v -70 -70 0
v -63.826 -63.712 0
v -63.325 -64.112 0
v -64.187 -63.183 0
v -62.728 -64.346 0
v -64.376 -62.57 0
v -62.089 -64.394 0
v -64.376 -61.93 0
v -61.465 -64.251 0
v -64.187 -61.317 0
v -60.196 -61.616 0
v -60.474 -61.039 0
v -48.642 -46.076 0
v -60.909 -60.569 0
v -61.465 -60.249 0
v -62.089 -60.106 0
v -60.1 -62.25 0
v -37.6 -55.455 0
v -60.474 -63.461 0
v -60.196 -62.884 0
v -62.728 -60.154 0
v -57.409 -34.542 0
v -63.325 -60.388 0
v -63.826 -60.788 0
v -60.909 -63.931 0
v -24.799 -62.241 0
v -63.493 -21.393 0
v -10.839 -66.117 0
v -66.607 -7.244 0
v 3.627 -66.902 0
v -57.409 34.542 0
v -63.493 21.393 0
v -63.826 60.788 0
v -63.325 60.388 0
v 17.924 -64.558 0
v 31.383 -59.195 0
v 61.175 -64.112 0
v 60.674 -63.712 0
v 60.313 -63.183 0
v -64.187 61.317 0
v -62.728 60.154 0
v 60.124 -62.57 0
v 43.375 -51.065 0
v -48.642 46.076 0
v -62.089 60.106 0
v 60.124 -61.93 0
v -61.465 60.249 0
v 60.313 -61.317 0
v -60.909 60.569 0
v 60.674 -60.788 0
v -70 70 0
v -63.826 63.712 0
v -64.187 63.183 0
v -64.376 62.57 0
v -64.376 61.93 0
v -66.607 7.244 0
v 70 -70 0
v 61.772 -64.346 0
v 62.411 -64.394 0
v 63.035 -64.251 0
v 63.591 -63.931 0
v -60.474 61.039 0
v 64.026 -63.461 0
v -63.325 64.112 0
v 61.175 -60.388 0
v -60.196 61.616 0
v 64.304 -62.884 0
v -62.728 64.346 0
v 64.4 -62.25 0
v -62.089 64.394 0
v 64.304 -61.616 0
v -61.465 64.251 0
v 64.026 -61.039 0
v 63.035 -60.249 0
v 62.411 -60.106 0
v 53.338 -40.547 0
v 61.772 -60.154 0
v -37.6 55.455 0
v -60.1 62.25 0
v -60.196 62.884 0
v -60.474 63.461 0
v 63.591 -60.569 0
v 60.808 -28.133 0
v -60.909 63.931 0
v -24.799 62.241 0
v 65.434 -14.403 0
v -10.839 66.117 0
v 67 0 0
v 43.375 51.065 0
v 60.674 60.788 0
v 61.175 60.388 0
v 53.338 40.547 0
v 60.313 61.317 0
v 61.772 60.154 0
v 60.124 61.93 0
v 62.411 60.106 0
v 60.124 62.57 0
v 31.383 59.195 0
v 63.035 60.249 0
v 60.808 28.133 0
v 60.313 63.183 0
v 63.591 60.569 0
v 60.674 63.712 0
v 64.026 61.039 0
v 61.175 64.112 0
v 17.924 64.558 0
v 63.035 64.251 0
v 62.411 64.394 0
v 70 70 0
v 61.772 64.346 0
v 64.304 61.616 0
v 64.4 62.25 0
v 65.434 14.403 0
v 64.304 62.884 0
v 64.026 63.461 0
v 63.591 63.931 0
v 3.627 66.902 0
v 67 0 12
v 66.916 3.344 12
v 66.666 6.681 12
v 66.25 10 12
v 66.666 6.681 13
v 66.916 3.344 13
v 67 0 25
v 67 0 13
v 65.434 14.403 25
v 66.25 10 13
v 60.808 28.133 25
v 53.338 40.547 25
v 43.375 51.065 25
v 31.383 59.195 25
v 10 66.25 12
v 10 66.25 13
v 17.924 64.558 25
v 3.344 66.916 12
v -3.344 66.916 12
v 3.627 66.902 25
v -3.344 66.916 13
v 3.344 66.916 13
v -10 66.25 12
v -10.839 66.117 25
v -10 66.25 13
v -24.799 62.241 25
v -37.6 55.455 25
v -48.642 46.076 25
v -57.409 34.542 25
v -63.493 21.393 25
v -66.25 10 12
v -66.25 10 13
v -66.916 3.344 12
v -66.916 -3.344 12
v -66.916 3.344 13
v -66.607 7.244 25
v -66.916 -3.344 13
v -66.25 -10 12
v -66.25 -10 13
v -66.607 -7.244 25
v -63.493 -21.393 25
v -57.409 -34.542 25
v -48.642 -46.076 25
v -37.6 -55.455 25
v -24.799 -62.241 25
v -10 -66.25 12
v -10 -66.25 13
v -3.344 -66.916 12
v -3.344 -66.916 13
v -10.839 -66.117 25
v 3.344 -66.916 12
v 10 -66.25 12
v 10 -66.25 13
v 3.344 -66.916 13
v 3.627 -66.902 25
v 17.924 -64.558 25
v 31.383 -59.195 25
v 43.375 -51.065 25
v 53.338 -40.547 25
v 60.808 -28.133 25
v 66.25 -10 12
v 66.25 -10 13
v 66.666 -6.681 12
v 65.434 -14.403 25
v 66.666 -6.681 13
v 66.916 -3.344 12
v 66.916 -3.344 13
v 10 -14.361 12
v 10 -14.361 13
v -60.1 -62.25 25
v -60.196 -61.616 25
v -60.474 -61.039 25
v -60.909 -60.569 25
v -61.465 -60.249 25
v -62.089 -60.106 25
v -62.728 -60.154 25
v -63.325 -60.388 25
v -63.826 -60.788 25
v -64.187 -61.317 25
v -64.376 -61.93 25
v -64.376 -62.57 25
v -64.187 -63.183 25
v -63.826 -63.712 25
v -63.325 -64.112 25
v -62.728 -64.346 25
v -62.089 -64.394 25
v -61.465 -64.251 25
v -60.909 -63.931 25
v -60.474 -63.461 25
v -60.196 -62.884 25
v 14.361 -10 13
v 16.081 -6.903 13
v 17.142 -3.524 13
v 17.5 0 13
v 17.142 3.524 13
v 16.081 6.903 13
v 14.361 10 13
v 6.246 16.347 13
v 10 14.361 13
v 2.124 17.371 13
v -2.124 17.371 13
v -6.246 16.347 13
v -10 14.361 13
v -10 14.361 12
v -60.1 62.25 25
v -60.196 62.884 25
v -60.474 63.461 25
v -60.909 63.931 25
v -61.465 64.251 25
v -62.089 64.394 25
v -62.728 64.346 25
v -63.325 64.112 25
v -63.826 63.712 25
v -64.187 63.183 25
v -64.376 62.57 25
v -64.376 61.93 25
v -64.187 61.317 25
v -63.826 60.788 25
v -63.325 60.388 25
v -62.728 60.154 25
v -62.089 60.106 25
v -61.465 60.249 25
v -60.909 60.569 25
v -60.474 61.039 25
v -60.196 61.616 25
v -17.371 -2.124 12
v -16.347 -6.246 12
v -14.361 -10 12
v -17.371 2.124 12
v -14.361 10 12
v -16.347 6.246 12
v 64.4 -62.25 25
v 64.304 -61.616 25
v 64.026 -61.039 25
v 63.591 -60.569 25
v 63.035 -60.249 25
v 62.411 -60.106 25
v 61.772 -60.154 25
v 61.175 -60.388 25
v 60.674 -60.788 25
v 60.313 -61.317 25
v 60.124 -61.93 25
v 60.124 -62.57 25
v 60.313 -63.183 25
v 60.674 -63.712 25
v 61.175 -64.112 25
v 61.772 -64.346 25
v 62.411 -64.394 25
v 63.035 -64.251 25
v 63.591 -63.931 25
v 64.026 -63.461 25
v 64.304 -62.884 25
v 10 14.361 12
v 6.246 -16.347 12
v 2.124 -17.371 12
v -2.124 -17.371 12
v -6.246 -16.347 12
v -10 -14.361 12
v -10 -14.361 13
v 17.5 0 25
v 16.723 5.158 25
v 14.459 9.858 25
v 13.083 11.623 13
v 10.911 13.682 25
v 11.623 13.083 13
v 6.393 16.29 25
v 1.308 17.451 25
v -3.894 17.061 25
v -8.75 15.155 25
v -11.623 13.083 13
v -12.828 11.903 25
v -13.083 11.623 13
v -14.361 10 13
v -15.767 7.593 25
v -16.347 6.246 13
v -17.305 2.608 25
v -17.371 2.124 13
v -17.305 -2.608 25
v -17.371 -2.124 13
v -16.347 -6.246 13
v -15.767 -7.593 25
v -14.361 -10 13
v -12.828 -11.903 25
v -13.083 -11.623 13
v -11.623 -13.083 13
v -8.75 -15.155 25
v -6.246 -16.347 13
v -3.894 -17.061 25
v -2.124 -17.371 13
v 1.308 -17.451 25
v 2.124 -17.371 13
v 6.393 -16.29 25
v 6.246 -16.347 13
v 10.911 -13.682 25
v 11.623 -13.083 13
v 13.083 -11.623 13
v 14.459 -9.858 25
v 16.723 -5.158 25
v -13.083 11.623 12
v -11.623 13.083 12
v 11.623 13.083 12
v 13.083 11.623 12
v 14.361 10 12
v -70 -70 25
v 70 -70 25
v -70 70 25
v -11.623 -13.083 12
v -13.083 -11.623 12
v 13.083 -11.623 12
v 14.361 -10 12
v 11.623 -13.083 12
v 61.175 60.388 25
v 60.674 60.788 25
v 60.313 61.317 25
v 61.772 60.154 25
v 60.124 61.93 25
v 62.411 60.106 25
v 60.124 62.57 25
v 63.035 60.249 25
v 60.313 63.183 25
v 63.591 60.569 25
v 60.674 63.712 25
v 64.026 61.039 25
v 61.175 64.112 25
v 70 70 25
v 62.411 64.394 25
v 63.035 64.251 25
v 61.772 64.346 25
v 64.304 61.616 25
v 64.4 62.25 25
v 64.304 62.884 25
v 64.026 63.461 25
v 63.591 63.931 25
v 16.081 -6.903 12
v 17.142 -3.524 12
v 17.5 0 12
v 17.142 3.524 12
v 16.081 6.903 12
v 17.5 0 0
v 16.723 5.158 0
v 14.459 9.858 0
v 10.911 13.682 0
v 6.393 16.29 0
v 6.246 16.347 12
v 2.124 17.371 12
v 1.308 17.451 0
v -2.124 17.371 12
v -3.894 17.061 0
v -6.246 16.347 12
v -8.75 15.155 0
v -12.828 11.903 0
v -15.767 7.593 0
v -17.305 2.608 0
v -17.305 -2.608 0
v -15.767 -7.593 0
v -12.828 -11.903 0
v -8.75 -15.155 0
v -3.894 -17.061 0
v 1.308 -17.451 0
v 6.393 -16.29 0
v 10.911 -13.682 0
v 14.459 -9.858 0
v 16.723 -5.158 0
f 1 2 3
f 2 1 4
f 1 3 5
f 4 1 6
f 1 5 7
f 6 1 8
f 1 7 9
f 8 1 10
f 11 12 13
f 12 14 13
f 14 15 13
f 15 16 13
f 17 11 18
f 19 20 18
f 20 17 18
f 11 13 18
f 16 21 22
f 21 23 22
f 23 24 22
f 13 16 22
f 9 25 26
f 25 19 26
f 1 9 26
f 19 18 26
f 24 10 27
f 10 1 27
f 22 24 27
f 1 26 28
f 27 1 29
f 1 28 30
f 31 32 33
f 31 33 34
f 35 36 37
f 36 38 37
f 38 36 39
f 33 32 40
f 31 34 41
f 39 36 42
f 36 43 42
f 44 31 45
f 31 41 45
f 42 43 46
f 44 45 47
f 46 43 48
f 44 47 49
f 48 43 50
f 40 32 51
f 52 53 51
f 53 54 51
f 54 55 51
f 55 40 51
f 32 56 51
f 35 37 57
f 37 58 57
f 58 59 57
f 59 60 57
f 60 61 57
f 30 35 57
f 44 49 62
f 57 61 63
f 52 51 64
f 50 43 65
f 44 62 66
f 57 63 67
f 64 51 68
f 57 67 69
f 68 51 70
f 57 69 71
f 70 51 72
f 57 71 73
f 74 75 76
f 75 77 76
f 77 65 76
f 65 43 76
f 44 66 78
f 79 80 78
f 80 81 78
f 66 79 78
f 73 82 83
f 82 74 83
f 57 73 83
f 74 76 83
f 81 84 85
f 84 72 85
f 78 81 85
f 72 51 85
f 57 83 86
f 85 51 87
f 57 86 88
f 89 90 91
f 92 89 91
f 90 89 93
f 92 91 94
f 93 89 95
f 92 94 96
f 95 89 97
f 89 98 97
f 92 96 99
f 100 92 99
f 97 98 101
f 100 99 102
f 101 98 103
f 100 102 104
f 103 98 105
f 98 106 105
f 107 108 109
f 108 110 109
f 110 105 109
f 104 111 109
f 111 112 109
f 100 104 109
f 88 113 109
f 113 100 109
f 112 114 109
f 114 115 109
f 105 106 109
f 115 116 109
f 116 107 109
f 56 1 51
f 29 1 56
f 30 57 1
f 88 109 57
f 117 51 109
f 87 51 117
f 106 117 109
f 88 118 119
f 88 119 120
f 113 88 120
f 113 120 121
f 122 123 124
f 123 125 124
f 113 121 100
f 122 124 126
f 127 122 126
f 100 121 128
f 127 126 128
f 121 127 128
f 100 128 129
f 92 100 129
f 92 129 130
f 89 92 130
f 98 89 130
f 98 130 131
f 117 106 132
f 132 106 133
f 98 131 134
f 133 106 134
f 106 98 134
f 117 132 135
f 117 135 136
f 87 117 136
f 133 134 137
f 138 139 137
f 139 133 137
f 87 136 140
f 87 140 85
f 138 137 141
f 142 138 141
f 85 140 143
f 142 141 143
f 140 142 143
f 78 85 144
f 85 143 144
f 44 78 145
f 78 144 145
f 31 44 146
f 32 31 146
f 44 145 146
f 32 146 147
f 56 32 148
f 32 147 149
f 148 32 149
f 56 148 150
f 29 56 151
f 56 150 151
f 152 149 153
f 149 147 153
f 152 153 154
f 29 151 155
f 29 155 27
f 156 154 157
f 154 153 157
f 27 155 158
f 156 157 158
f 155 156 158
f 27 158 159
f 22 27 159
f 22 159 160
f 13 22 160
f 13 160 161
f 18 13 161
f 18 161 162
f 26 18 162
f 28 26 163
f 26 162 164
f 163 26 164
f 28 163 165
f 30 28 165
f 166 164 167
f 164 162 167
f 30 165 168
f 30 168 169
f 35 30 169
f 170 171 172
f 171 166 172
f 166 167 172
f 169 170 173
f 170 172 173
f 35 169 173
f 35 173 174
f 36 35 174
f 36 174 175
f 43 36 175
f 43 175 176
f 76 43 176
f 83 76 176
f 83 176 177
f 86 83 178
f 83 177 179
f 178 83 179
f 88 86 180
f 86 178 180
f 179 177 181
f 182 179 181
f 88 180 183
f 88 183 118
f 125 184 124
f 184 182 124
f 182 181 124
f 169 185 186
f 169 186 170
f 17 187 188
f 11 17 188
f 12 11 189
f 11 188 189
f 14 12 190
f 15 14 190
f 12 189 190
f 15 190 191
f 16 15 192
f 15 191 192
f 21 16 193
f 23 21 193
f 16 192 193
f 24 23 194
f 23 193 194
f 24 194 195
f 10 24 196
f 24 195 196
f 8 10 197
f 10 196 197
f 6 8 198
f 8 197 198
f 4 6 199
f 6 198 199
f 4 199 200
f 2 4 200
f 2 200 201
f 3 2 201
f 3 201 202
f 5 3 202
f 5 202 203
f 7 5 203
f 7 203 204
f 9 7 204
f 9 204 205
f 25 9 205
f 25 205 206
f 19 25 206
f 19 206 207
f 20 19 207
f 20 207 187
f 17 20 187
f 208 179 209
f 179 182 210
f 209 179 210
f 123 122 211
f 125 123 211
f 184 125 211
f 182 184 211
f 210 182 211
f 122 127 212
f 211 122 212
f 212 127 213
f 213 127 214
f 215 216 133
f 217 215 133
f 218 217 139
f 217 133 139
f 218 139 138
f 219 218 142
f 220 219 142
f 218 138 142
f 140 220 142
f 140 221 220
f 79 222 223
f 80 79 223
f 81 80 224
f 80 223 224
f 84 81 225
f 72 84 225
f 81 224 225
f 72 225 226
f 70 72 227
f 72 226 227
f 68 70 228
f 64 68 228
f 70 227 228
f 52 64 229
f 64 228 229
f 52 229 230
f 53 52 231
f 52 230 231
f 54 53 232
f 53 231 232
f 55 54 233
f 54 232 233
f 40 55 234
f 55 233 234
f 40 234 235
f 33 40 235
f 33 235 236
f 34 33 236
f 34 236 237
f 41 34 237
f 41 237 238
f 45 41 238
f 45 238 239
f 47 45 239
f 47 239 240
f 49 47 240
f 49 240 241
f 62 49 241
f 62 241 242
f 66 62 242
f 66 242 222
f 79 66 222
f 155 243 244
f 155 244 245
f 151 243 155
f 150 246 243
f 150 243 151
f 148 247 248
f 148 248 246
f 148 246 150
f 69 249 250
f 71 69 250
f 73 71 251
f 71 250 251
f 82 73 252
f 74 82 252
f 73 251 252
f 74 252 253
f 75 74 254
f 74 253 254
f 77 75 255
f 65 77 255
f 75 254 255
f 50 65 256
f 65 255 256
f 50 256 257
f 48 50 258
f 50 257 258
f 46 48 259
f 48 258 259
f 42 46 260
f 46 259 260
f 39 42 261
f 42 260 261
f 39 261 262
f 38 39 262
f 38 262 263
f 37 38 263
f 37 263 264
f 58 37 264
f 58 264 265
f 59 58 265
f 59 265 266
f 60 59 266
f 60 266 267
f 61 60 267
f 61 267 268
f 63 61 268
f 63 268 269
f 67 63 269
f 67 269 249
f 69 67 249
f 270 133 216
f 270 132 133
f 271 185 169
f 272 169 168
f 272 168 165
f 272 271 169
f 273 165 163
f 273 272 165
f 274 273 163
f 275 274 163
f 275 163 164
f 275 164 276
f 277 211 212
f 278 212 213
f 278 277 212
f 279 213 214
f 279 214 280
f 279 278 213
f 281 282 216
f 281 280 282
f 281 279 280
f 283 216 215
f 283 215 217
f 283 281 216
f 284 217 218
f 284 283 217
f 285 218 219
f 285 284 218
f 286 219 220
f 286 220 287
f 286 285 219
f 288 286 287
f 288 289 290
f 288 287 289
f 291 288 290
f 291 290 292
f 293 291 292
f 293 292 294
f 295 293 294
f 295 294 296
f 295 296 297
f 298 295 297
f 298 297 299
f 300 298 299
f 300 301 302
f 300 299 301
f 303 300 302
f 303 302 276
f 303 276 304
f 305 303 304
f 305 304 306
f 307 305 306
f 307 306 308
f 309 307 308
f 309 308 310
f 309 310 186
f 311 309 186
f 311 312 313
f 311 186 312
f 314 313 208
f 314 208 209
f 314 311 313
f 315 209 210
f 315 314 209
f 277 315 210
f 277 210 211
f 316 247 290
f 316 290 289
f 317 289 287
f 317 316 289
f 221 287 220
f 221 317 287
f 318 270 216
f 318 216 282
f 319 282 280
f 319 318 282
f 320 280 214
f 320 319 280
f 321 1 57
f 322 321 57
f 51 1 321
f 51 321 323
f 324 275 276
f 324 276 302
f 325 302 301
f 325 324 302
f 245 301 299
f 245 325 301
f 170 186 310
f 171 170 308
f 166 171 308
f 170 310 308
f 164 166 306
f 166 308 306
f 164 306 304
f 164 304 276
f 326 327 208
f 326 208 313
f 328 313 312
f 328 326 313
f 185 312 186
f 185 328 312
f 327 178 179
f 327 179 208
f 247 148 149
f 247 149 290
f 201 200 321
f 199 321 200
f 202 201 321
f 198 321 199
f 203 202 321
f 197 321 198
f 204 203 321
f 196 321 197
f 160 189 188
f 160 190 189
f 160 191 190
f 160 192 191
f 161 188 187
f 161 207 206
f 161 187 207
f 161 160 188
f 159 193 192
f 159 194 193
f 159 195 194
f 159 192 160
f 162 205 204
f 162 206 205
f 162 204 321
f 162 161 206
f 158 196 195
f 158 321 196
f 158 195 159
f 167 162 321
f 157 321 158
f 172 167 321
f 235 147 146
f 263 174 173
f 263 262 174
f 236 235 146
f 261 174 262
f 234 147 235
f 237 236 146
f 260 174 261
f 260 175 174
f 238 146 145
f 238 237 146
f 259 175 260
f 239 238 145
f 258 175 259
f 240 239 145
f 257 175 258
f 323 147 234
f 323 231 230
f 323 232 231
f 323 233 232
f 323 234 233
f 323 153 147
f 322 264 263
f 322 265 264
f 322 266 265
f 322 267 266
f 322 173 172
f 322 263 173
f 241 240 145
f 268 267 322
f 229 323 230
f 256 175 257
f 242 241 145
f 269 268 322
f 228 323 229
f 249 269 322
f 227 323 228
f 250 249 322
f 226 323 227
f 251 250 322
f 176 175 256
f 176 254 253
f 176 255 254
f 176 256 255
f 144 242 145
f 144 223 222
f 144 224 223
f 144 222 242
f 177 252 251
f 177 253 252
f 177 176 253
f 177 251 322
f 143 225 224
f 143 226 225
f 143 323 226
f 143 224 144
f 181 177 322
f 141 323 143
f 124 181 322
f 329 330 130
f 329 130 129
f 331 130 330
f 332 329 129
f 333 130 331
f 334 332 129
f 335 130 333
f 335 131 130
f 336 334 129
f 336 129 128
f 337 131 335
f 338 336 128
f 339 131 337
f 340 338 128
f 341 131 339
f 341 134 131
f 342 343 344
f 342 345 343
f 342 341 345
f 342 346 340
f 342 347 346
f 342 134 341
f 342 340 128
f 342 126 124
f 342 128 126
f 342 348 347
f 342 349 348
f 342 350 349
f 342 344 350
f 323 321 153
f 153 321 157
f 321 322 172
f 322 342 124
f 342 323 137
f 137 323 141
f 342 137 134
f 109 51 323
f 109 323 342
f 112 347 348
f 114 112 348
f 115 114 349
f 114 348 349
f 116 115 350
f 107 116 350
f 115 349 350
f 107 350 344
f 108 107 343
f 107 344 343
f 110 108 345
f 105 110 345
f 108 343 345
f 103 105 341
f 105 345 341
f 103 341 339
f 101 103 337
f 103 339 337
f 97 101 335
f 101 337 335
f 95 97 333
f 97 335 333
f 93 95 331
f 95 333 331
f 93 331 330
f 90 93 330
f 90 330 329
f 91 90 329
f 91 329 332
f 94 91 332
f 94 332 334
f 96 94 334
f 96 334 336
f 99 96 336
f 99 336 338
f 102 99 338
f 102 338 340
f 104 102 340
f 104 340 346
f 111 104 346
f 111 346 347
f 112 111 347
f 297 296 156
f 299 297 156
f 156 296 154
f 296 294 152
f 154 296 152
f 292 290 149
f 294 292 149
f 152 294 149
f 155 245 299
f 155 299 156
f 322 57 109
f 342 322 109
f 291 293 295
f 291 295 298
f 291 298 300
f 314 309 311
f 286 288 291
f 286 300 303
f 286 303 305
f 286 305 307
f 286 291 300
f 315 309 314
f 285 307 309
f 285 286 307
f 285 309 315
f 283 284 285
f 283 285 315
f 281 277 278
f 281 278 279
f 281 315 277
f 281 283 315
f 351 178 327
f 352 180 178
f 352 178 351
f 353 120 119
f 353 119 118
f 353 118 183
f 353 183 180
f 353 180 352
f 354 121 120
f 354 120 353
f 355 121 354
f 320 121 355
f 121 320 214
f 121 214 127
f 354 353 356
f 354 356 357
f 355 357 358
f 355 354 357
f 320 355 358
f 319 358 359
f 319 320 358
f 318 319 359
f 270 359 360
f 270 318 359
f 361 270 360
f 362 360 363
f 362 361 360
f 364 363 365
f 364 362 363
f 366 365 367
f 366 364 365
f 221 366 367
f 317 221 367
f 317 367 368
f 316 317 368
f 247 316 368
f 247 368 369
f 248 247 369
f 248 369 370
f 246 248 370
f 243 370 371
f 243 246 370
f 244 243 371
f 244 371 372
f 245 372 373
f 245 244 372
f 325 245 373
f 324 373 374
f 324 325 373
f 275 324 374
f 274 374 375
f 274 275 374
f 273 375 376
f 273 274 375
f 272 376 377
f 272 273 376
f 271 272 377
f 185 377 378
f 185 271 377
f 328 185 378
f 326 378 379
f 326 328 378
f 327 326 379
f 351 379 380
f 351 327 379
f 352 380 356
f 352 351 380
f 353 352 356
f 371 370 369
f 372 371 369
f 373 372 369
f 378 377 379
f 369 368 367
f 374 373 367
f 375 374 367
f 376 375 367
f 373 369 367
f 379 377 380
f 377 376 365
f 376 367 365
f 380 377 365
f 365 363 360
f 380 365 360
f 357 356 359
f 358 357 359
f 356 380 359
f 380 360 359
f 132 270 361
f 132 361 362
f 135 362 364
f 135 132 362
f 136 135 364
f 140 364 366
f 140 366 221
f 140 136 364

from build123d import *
from build123d.topology import SkipClean

# Parameters (mm, degrees)
SKICA1_W                 = 140
SKICA1_H                 = 140
P_IDAT_VYSUNUT_M1_DEPTH  = 25
SKICA2_R                 = 2.15
ODEBRAT_VYSUNUT_M1_DEPTH = 103.102889283
SKICA3_R                 = 67
SKICA3_R_2               = 17.5
ODEBRAT_VYSUNUT_M3_DEPTH = 103.102889283
P_IDAT_VYSUNUT_M2_DEPTH  = 0.5


with BuildPart() as part:
    # Skica1 → Přidat vysunutím1 (new body)
    with BuildSketch(Plane.XY):
        Rectangle(SKICA1_W, SKICA1_H)
    extrude(amount=P_IDAT_VYSUNUT_M1_DEPTH)

    # Skica2 → Odebrat vysunutím1 (cut, through all)
    with BuildSketch(Plane.XY.offset(25)):
        with Locations((-62.25, 62.25)):
            Circle(SKICA2_R)
        with Locations((-62.25, -62.25)):
            Circle(SKICA2_R)
        with Locations((62.25, -62.25)):
            Circle(SKICA2_R)
        with Locations((62.25, 62.25)):
            Circle(SKICA2_R)
    extrude(amount=-ODEBRAT_VYSUNUT_M1_DEPTH, mode=Mode.SUBTRACT)

    # Skica3 → Odebrat vysunutím3 (cut, through all)
    with BuildSketch(Plane.XY.offset(25)):
        Circle(SKICA3_R)
        Circle(SKICA3_R_2, mode=Mode.SUBTRACT)
    extrude(amount=-ODEBRAT_VYSUNUT_M3_DEPTH, mode=Mode.SUBTRACT)


with BuildPart() as odebrat_vysunut_m3_piece_1:
    # of the separate pieces the step leaves, piece 1, a body of its own (odebrat_vysunut_m3_pieces)
    add(part.part.solids().sort_by_distance((-70, 70, 0))[0])



with BuildPart() as odebrat_vysunut_m3_piece_2:
    # of the separate pieces the step leaves, piece 2, a body of its own (odebrat_vysunut_m3_pieces)
    add(part.part.solids().sort_by_distance((17.5, 0, 0))[0])


with BuildPart() as odebrat_vysunut_m3_piece_1_1:
    with SkipClean():  # the faces are left unmerged after this step: merging them gives an invalid solid
        add(odebrat_vysunut_m3_piece_1.part)

        add(odebrat_vysunut_m3_piece_2.part)  # Přidat vysunutím2 merges Odebrat vysunutím3 piece 2
        # Skica4 → Přidat vysunutím2 (add, symmetric)
        with BuildSketch(Plane(origin=(0, 0, 12.5), x_dir=(-1, 0, 0), z_dir=(0, 0, -1))):
            with BuildLine():
                Line((-10, 66.2495283), (-10, 14.361406616))
                ThreePointArc((-10, 14.361406616), (-12.374368671, 12.374368671), (-14.361406616, 10))
                Line((-14.361406616, 10), (-66.2495283, 10))
                ThreePointArc((-66.2495283, 10), (-67, 0), (-66.2495283, -10))
                Line((-66.2495283, -10), (-14.361406616, -10))
                ThreePointArc((-14.361406616, -10), (-12.374368671, -12.374368671), (-10, -14.361406616))
                Line((-10, -14.361406616), (-10, -66.2495283))
                ThreePointArc((-10, -66.2495283), (0, -67), (10, -66.2495283))
                Line((10, -66.2495283), (10, -14.361406616))
                ThreePointArc((10, -14.361406616), (12.374368671, -12.374368671), (14.361406616, -10))
                Line((14.361406616, -10), (66.2495283, -10))
                ThreePointArc((66.2495283, -10), (67, 0), (66.2495283, 10))
                Line((66.2495283, 10), (14.361406616, 10))
                ThreePointArc((14.361406616, 10), (12.374368671, 12.374368671), (10, 14.361406616))
                Line((10, 14.361406616), (10, 66.2495283))
                ThreePointArc((10, 66.2495283), (0, 67), (-10, 66.2495283))
            make_face()
        extrude(amount=P_IDAT_VYSUNUT_M2_DEPTH, both=True)


solid = odebrat_vysunut_m3_piece_1_1.part
